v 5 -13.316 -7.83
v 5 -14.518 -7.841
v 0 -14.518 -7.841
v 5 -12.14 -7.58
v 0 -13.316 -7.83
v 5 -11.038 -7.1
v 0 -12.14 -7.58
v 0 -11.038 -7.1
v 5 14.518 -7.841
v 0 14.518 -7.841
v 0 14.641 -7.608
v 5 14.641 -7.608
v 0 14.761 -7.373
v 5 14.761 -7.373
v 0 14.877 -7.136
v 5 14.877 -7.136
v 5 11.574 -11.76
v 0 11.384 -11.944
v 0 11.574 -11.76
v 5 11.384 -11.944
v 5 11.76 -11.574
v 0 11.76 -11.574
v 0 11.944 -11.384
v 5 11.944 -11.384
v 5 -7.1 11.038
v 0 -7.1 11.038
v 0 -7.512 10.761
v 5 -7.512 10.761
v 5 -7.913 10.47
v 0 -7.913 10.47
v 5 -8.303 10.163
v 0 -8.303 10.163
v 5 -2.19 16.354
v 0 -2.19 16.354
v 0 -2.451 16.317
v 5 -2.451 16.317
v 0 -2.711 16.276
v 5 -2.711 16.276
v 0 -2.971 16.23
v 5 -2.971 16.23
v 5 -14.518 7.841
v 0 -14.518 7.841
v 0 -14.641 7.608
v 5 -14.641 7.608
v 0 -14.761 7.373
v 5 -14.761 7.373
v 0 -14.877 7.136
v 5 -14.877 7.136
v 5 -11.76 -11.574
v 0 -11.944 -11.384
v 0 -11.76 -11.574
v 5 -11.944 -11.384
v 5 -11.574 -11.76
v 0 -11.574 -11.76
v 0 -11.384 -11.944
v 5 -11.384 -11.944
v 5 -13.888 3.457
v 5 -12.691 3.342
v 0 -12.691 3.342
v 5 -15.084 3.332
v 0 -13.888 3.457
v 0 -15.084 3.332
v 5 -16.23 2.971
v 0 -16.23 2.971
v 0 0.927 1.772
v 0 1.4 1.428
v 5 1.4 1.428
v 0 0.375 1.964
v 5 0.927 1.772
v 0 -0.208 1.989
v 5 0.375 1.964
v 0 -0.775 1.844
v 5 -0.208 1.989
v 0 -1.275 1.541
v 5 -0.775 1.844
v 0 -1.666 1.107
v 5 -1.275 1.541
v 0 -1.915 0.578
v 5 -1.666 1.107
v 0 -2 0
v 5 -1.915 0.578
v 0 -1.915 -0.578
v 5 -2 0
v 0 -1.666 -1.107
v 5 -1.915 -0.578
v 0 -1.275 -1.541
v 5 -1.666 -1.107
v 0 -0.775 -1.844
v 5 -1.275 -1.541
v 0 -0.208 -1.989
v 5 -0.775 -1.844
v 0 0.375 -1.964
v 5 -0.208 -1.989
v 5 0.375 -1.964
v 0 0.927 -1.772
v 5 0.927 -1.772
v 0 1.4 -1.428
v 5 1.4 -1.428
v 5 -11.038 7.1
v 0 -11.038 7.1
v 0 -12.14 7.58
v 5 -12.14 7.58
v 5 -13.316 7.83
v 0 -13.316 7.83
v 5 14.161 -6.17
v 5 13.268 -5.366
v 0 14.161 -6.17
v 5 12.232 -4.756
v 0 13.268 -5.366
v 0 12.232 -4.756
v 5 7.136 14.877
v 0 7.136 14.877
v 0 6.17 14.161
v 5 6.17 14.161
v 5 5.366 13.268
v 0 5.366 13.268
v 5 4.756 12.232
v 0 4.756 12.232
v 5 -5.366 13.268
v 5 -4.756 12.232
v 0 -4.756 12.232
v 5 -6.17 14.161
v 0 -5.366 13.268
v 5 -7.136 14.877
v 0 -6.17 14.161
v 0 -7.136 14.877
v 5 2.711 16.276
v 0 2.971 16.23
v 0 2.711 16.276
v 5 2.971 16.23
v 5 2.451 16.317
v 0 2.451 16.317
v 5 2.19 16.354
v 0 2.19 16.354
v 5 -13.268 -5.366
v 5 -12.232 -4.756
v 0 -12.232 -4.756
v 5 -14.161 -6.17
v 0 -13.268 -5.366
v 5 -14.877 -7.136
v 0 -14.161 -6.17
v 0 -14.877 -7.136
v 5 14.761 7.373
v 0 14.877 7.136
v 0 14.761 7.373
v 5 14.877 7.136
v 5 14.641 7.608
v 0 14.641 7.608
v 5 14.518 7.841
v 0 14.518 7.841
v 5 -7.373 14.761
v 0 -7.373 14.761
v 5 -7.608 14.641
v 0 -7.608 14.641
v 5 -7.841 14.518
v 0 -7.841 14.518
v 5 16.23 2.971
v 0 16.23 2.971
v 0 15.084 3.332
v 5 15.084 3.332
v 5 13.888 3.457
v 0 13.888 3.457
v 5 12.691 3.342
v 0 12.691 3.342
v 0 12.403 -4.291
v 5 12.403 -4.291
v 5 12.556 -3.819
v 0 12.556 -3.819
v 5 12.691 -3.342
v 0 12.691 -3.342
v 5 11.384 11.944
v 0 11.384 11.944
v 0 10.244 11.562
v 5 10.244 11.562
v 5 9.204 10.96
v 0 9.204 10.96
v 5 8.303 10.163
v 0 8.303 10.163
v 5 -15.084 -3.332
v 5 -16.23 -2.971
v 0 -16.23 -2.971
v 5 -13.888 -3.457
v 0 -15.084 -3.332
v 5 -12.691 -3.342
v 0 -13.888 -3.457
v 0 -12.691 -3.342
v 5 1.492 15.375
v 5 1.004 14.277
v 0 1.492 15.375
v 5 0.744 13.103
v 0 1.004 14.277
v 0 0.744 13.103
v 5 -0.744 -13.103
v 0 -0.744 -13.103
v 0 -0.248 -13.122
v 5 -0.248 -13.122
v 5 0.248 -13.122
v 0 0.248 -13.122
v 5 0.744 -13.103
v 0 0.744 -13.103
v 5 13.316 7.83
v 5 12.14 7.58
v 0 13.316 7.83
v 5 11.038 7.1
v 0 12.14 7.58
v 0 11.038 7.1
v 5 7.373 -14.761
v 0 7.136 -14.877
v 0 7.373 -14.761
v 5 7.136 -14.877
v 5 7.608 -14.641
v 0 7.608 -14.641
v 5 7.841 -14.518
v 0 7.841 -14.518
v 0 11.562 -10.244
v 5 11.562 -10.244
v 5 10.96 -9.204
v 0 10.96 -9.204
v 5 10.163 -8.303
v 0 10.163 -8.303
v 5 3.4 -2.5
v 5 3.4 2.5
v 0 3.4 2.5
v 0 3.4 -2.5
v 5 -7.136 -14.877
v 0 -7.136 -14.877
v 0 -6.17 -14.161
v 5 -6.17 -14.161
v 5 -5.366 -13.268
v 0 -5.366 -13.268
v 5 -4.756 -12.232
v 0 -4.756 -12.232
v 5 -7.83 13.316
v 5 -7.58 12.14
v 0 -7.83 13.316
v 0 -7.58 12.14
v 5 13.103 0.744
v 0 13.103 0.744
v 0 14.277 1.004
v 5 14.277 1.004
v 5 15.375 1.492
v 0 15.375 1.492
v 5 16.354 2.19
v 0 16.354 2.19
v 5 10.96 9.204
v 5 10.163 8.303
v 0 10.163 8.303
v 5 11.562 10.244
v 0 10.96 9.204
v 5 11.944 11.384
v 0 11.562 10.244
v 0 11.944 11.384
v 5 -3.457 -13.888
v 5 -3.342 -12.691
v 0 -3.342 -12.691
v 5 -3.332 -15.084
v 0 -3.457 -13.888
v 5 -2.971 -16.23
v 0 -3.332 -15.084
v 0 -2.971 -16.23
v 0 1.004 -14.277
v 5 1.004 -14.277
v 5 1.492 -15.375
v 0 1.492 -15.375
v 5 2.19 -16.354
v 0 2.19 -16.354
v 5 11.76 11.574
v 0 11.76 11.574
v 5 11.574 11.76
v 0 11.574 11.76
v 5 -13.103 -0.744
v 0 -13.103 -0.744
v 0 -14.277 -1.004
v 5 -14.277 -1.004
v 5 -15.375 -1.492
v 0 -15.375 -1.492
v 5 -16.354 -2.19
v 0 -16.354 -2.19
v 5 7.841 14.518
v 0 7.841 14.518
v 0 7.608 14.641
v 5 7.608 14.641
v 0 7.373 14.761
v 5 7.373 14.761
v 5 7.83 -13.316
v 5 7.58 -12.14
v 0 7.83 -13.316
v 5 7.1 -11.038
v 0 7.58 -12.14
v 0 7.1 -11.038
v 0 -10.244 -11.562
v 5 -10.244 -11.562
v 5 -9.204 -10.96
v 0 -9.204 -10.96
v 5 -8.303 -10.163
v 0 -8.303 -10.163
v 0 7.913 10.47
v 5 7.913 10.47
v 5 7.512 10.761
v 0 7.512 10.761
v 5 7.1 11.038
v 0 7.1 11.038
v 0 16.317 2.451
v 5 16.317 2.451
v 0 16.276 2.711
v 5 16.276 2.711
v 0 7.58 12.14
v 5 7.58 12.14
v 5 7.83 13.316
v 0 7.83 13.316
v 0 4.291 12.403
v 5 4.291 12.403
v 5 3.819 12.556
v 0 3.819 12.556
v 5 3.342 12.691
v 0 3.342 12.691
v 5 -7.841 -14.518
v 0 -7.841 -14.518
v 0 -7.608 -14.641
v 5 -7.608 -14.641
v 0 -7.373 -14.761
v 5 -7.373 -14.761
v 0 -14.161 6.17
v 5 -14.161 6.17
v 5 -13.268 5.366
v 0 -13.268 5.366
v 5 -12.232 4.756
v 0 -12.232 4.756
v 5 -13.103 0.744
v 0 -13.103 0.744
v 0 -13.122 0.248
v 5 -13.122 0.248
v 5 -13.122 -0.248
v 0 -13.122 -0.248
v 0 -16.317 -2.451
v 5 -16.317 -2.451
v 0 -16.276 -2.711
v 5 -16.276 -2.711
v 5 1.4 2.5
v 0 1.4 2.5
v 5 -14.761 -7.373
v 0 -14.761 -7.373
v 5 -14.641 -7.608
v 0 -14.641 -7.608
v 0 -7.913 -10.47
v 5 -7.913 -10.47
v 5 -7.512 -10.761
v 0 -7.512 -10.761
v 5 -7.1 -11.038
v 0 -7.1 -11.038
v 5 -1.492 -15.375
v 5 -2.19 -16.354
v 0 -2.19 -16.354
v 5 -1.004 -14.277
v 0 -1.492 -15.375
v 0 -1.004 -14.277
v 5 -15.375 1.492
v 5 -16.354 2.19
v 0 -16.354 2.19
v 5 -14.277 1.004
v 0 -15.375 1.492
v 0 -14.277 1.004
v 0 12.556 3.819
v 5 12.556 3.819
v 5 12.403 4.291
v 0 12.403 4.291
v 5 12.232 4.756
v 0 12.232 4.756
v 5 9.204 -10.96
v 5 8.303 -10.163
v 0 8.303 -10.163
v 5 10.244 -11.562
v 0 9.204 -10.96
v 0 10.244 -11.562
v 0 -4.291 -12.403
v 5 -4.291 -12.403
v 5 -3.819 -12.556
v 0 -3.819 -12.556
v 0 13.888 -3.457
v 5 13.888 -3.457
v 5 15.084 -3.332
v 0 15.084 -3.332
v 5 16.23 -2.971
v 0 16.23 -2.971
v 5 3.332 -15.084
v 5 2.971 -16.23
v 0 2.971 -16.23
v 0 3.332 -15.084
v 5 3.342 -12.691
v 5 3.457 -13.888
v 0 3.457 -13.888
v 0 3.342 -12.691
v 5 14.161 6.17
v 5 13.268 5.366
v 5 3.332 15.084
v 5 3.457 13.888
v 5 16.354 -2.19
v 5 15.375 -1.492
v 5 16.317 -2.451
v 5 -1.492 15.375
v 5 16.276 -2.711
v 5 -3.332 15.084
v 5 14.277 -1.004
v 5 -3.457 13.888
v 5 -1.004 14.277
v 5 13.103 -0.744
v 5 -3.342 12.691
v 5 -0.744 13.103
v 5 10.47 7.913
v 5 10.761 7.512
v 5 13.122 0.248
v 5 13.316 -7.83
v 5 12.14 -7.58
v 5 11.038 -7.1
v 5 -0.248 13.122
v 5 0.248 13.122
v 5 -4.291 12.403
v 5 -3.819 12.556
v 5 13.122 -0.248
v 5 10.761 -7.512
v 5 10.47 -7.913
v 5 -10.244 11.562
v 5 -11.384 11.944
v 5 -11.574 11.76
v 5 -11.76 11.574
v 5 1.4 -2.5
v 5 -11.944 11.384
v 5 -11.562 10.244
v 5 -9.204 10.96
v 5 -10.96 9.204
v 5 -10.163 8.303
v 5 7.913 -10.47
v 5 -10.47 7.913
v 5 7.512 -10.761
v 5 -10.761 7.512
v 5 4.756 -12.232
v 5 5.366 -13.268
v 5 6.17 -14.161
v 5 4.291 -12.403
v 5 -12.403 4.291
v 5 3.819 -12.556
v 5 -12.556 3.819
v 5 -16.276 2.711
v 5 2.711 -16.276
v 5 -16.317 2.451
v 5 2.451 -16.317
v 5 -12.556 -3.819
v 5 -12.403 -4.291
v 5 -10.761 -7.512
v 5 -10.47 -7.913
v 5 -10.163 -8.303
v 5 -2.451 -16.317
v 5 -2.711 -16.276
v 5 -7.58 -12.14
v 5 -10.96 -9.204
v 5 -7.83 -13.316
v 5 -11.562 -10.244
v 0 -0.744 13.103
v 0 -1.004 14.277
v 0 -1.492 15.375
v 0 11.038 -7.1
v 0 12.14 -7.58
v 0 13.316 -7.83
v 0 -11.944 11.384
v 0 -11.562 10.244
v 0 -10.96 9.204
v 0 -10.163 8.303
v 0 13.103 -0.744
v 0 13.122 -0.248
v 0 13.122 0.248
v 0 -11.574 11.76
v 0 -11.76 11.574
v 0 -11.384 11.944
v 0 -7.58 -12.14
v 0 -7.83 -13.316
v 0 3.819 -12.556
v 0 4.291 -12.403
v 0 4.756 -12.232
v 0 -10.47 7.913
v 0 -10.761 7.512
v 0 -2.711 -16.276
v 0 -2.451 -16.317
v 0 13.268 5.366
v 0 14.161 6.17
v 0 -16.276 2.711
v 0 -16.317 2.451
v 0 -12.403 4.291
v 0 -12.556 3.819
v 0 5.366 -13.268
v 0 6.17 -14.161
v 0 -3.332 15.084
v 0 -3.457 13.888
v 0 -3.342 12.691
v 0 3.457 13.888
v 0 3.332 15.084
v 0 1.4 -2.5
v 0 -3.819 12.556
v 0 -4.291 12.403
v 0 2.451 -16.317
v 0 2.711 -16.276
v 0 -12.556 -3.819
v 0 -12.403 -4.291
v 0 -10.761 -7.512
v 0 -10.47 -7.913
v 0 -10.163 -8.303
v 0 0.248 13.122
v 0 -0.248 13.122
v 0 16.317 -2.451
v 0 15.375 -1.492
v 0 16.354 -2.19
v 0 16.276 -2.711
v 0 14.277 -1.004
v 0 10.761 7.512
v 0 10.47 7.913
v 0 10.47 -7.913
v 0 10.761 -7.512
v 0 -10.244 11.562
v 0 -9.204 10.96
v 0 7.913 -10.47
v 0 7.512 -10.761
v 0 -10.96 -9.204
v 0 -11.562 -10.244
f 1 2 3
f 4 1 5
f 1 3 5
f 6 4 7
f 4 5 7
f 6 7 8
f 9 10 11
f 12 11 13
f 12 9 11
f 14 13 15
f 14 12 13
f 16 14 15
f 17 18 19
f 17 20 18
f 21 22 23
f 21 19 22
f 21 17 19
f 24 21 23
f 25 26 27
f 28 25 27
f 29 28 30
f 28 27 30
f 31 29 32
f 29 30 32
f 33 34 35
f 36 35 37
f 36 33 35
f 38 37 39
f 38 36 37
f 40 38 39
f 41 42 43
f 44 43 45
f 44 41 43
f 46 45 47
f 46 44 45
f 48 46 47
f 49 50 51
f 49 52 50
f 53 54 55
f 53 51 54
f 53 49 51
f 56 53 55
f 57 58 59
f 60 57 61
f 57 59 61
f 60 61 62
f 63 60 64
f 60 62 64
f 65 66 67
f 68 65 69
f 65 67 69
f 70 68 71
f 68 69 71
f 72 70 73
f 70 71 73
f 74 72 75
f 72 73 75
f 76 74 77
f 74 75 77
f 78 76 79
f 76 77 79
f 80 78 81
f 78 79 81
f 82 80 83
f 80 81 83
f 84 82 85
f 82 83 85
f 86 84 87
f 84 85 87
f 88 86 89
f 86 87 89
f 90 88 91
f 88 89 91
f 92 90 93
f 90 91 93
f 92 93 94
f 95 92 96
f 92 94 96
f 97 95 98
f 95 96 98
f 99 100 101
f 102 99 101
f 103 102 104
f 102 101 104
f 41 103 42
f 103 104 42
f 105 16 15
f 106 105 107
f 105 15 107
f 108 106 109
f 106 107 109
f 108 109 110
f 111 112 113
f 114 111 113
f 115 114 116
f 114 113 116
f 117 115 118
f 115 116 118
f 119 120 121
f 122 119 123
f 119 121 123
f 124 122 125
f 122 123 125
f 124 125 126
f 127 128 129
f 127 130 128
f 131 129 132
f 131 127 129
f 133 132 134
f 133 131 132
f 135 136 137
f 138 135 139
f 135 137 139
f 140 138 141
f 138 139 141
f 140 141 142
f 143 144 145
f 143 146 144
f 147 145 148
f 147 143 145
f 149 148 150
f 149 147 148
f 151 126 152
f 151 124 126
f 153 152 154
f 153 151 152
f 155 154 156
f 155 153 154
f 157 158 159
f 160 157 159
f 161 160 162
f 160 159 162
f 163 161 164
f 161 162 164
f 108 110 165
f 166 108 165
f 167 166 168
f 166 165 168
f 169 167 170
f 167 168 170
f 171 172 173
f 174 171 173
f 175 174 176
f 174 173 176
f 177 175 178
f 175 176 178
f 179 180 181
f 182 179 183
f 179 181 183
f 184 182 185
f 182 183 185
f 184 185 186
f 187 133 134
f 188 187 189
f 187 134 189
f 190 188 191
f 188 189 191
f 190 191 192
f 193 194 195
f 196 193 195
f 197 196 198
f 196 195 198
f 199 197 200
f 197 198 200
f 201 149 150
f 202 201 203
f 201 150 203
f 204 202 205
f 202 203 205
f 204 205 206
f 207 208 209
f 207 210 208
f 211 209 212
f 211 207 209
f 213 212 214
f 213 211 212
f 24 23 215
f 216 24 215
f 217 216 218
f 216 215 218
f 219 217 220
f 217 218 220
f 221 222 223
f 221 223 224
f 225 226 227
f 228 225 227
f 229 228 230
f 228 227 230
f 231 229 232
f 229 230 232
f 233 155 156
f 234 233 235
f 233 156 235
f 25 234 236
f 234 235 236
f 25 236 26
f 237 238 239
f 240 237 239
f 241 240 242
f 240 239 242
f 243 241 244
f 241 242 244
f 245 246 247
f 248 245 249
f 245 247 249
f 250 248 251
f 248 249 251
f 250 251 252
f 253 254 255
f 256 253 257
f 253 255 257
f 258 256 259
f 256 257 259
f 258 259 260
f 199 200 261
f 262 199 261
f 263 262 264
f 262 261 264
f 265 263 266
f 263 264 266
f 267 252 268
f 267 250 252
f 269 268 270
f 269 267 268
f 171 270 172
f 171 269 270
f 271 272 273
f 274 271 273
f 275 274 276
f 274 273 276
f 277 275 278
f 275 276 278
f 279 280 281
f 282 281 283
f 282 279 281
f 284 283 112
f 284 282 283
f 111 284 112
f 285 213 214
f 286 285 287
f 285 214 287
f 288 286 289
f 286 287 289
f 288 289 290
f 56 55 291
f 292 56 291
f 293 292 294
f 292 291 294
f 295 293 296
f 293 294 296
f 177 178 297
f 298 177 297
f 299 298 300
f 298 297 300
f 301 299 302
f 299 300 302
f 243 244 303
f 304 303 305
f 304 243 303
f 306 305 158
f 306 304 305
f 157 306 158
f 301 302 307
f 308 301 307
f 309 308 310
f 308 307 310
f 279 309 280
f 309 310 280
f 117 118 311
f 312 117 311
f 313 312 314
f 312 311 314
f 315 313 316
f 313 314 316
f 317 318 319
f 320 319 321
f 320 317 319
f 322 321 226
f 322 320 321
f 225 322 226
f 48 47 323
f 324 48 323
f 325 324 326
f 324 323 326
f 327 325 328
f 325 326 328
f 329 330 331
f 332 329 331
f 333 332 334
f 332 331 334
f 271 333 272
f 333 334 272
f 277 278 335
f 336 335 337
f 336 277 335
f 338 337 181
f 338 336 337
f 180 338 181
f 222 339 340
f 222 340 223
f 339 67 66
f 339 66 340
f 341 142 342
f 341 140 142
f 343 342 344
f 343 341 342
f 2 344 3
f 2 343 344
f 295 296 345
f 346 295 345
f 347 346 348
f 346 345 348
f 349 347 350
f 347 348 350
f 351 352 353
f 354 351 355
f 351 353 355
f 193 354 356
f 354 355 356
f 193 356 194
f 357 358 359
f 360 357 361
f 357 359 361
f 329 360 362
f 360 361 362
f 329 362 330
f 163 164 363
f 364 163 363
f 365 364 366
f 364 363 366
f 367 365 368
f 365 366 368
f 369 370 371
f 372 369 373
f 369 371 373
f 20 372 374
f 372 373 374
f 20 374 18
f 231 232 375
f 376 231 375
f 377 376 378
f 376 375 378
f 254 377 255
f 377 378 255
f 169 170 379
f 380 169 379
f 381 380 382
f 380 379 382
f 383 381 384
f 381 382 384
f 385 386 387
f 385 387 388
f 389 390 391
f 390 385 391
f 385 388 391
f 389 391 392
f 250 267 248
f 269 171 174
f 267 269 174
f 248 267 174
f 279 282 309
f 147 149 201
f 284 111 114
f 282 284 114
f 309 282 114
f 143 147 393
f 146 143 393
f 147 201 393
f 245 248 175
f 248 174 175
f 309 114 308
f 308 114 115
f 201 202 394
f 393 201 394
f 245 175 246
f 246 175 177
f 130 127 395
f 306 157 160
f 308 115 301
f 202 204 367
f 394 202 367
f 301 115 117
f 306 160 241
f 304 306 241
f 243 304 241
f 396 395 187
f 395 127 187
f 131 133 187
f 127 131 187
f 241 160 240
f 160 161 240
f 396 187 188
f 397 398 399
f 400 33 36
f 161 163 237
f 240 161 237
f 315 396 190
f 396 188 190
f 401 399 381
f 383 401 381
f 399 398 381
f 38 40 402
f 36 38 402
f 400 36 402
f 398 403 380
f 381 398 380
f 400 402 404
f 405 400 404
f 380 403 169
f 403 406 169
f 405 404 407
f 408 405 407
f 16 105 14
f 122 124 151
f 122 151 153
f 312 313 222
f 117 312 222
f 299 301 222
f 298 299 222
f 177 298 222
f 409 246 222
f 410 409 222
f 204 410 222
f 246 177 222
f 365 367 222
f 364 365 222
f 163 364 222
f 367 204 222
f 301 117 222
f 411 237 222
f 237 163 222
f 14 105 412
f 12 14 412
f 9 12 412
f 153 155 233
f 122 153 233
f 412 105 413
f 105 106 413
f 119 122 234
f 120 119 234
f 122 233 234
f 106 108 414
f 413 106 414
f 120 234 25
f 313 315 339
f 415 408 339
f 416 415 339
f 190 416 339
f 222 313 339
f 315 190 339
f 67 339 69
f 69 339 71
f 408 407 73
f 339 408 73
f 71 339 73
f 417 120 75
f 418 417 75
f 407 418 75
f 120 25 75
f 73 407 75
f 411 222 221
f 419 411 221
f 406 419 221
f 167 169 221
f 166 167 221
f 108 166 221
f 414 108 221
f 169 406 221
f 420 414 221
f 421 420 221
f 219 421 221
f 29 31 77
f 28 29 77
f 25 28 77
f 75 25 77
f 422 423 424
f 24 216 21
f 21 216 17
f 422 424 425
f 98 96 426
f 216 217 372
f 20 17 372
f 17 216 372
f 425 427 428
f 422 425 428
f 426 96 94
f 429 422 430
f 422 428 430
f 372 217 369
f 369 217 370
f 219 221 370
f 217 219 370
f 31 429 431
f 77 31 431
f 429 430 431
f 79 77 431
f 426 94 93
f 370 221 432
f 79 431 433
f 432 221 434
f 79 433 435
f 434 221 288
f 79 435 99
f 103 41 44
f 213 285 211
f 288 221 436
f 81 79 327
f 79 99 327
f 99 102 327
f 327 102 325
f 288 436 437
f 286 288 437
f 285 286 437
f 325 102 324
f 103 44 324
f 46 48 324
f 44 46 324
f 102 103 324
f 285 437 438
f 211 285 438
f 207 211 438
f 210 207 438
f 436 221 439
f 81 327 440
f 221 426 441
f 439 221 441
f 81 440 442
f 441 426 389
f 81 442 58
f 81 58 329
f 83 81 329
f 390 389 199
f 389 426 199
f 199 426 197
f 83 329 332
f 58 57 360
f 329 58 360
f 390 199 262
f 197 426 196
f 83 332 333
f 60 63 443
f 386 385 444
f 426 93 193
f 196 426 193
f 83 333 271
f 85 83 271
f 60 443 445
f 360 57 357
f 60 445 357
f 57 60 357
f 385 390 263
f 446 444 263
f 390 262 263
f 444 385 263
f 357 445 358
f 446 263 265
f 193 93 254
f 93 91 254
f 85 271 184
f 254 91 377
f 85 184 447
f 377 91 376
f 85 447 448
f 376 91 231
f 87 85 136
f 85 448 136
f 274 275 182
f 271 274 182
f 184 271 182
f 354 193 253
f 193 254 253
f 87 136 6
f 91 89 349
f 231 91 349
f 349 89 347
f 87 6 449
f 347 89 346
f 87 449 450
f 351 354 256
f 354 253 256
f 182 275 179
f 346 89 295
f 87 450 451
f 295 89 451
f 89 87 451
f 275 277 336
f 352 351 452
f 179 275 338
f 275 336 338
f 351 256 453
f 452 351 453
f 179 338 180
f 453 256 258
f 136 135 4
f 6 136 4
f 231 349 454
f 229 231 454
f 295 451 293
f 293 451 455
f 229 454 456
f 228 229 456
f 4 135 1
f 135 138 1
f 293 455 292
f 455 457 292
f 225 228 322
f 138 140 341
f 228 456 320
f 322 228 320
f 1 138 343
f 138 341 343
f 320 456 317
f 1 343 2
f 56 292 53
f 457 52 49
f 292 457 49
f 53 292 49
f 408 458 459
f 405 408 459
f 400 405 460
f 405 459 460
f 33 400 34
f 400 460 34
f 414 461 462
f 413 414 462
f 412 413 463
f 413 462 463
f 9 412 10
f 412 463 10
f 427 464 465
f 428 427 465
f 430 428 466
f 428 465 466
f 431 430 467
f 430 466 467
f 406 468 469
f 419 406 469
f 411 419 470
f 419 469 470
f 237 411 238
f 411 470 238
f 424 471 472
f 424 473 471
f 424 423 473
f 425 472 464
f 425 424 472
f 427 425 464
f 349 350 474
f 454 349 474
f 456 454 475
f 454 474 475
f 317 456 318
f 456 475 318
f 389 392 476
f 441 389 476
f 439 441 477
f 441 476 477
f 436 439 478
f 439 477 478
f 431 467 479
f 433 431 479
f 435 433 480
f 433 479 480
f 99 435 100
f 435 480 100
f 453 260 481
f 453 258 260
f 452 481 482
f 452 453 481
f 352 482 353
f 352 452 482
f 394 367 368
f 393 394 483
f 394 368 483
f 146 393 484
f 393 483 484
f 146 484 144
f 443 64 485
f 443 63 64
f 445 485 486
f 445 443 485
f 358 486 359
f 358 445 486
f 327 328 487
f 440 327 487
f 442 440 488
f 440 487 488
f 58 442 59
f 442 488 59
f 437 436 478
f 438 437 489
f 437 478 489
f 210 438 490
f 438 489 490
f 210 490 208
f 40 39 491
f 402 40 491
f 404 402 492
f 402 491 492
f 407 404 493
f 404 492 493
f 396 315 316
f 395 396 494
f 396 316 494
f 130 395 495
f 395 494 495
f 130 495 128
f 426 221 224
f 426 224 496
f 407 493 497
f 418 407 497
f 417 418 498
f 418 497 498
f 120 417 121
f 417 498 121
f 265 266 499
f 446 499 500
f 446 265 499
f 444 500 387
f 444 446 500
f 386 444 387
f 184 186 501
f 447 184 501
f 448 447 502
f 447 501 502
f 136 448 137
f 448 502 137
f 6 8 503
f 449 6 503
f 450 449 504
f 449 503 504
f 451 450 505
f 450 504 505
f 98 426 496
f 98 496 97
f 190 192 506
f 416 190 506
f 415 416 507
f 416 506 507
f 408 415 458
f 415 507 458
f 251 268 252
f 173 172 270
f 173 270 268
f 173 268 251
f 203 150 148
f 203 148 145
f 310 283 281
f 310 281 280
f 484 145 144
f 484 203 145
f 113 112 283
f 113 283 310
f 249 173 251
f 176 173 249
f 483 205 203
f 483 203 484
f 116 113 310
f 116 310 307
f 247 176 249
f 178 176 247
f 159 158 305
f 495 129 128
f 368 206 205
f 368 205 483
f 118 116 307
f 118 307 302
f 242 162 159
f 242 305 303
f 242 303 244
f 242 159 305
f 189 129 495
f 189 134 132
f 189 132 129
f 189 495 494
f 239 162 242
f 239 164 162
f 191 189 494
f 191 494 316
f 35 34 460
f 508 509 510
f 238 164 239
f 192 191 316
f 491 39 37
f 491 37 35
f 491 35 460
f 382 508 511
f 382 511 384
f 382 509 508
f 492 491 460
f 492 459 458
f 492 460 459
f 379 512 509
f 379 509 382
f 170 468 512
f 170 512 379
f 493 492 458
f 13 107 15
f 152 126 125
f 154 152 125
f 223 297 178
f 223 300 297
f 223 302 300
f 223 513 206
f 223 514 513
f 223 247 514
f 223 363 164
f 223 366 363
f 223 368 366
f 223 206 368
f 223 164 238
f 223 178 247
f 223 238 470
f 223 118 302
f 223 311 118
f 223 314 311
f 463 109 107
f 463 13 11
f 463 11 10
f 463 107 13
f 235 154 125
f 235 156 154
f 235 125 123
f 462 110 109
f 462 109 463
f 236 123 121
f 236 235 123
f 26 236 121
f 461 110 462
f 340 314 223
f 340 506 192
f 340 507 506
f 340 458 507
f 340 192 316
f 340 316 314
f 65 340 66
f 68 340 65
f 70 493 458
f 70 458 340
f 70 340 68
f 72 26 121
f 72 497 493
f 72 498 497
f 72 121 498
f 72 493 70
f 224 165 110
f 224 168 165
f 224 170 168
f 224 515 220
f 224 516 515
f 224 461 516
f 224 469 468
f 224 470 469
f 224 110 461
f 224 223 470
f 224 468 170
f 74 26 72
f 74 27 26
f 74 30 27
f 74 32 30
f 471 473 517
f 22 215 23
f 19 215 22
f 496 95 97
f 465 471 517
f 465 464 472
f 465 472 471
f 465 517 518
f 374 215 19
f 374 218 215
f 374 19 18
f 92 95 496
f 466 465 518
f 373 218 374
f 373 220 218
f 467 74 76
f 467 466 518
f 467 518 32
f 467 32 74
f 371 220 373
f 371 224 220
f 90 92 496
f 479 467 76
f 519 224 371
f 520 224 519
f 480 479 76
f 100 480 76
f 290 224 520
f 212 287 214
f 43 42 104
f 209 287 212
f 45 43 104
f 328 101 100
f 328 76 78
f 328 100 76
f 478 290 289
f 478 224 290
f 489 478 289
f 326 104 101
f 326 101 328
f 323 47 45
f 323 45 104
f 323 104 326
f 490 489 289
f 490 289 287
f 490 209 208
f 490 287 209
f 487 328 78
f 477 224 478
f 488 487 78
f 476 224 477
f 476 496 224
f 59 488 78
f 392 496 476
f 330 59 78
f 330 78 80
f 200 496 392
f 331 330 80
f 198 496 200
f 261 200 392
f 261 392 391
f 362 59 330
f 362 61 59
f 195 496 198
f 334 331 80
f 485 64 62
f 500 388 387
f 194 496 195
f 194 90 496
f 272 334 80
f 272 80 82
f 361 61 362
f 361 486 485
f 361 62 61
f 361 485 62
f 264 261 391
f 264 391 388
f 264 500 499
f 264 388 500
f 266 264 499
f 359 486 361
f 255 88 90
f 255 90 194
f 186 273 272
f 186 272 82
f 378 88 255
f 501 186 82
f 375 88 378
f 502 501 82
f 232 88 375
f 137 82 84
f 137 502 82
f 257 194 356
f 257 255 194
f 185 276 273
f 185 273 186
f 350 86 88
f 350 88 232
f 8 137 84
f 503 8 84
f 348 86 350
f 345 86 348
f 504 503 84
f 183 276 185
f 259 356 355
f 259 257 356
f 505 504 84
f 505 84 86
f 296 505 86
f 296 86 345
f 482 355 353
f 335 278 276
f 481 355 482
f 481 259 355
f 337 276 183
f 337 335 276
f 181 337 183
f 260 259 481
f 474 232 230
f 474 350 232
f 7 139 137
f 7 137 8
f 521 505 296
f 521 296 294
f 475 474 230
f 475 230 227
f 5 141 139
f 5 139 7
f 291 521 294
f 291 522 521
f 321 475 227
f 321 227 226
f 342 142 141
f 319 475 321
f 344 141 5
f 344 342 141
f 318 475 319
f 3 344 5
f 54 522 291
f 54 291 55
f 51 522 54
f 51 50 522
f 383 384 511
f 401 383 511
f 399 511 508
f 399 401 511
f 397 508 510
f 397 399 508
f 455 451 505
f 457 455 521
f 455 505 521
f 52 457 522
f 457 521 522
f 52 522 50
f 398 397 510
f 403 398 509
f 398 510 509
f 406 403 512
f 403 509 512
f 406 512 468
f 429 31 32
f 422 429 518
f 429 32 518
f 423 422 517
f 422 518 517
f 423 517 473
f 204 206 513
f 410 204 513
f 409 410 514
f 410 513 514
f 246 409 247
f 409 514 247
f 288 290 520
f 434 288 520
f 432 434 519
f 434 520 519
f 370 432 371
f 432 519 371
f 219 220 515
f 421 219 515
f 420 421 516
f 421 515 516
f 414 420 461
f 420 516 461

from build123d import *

# Parameters (mm, degrees)
BASPROSKE_W        = 5
BASPROSKE_H        = 16.5
TOOTHCUT_DEPTH     = 24.864199128
TEETHCUTS_COUNT    = 20
TEETHCUTS_ANGLE    = 342
BORSKE_R           = 2
BORE_DEPTH         = 50.0000508
CUT_EXTRUDE1_DEPTH = 10


with BuildPart() as part:
    # BasProSke → Base-Revolve (revolve)
    with BuildSketch(Plane(origin=(0, 0, 0), x_dir=(1, 0, 0), z_dir=(0, 1, 0)), mode=Mode.PRIVATE) as base_revolve_sk:
        with Locations((2.5, 8.25)):
            Rectangle(BASPROSKE_W, BASPROSKE_H)
    revolve(base_revolve_sk.sketch.rotate(Axis((-10, 0, 0), (1, 0, 0)), 180), axis=Axis((-10, 0, 0), (1, 0, 0)))

    # TooCutSke → ToothCut (cut, through all)
    with BuildSketch(Plane(origin=(0, 0, 0), x_dir=(0, 0, -1), z_dir=(1, 0, 0))):
        with BuildLine():
            ThreePointArc((0.74381438, 13.102904875), (0, 13.124), (-0.74381438, 13.102904875))
            ThreePointArc((-0.74381438, 13.102904875), (-1.226473103, 14.852072512), (-2.209965745, 16.376962373))
            ThreePointArc((-2.209965745, 16.376962373), (0, 16.5254), (2.209965745, 16.376962373))
            ThreePointArc((2.209965745, 16.376962373), (1.226473103, 14.852072512), (0.74381438, 13.102904875))
        make_face()
    toothcut = extrude(amount=TOOTHCUT_DEPTH, mode=Mode.SUBTRACT)

    # TeethCuts: ToothCut ×20 about axis
    teethcuts_axis = Axis((-10, 0, 0), (1, 0, 0))
    for i in range(1, TEETHCUTS_COUNT):
        add(toothcut.rotate(teethcuts_axis, i * TEETHCUTS_ANGLE / (TEETHCUTS_COUNT - 1)), mode=Mode.SUBTRACT)

    # BorSke → Bore (cut, symmetric)
    with BuildSketch(Plane(origin=(0, 0, 0), x_dir=(0, 0, -1), z_dir=(1, 0, 0))):
        with Locations(Location((0, 0, 0), (0, 0, 180))):
            Circle(BORSKE_R)
    extrude(amount=BORE_DEPTH, both=True, mode=Mode.SUBTRACT)

    # Sketch1 → Cut-Extrude1 (cut)
    with BuildSketch(Plane(origin=(5, 0, 0), x_dir=(0, 0, -1), z_dir=(1, 0, 0))):
        with BuildLine():
            Line((-1.428285686, 1.4), (-2.5, 1.4))
            Line((-2.5, 1.4), (-2.5, 3.4))
            Line((-2.5, 3.4), (2.5, 3.4))
            Line((2.5, 3.4), (2.5, 1.4))
            Line((2.5, 1.4), (1.428285686, 1.4))
            ThreePointArc((1.428285686, 1.4), (0, 2), (-1.428285686, 1.4))
        make_face()
    extrude(amount=-CUT_EXTRUDE1_DEPTH, mode=Mode.SUBTRACT)


solid = part.part
